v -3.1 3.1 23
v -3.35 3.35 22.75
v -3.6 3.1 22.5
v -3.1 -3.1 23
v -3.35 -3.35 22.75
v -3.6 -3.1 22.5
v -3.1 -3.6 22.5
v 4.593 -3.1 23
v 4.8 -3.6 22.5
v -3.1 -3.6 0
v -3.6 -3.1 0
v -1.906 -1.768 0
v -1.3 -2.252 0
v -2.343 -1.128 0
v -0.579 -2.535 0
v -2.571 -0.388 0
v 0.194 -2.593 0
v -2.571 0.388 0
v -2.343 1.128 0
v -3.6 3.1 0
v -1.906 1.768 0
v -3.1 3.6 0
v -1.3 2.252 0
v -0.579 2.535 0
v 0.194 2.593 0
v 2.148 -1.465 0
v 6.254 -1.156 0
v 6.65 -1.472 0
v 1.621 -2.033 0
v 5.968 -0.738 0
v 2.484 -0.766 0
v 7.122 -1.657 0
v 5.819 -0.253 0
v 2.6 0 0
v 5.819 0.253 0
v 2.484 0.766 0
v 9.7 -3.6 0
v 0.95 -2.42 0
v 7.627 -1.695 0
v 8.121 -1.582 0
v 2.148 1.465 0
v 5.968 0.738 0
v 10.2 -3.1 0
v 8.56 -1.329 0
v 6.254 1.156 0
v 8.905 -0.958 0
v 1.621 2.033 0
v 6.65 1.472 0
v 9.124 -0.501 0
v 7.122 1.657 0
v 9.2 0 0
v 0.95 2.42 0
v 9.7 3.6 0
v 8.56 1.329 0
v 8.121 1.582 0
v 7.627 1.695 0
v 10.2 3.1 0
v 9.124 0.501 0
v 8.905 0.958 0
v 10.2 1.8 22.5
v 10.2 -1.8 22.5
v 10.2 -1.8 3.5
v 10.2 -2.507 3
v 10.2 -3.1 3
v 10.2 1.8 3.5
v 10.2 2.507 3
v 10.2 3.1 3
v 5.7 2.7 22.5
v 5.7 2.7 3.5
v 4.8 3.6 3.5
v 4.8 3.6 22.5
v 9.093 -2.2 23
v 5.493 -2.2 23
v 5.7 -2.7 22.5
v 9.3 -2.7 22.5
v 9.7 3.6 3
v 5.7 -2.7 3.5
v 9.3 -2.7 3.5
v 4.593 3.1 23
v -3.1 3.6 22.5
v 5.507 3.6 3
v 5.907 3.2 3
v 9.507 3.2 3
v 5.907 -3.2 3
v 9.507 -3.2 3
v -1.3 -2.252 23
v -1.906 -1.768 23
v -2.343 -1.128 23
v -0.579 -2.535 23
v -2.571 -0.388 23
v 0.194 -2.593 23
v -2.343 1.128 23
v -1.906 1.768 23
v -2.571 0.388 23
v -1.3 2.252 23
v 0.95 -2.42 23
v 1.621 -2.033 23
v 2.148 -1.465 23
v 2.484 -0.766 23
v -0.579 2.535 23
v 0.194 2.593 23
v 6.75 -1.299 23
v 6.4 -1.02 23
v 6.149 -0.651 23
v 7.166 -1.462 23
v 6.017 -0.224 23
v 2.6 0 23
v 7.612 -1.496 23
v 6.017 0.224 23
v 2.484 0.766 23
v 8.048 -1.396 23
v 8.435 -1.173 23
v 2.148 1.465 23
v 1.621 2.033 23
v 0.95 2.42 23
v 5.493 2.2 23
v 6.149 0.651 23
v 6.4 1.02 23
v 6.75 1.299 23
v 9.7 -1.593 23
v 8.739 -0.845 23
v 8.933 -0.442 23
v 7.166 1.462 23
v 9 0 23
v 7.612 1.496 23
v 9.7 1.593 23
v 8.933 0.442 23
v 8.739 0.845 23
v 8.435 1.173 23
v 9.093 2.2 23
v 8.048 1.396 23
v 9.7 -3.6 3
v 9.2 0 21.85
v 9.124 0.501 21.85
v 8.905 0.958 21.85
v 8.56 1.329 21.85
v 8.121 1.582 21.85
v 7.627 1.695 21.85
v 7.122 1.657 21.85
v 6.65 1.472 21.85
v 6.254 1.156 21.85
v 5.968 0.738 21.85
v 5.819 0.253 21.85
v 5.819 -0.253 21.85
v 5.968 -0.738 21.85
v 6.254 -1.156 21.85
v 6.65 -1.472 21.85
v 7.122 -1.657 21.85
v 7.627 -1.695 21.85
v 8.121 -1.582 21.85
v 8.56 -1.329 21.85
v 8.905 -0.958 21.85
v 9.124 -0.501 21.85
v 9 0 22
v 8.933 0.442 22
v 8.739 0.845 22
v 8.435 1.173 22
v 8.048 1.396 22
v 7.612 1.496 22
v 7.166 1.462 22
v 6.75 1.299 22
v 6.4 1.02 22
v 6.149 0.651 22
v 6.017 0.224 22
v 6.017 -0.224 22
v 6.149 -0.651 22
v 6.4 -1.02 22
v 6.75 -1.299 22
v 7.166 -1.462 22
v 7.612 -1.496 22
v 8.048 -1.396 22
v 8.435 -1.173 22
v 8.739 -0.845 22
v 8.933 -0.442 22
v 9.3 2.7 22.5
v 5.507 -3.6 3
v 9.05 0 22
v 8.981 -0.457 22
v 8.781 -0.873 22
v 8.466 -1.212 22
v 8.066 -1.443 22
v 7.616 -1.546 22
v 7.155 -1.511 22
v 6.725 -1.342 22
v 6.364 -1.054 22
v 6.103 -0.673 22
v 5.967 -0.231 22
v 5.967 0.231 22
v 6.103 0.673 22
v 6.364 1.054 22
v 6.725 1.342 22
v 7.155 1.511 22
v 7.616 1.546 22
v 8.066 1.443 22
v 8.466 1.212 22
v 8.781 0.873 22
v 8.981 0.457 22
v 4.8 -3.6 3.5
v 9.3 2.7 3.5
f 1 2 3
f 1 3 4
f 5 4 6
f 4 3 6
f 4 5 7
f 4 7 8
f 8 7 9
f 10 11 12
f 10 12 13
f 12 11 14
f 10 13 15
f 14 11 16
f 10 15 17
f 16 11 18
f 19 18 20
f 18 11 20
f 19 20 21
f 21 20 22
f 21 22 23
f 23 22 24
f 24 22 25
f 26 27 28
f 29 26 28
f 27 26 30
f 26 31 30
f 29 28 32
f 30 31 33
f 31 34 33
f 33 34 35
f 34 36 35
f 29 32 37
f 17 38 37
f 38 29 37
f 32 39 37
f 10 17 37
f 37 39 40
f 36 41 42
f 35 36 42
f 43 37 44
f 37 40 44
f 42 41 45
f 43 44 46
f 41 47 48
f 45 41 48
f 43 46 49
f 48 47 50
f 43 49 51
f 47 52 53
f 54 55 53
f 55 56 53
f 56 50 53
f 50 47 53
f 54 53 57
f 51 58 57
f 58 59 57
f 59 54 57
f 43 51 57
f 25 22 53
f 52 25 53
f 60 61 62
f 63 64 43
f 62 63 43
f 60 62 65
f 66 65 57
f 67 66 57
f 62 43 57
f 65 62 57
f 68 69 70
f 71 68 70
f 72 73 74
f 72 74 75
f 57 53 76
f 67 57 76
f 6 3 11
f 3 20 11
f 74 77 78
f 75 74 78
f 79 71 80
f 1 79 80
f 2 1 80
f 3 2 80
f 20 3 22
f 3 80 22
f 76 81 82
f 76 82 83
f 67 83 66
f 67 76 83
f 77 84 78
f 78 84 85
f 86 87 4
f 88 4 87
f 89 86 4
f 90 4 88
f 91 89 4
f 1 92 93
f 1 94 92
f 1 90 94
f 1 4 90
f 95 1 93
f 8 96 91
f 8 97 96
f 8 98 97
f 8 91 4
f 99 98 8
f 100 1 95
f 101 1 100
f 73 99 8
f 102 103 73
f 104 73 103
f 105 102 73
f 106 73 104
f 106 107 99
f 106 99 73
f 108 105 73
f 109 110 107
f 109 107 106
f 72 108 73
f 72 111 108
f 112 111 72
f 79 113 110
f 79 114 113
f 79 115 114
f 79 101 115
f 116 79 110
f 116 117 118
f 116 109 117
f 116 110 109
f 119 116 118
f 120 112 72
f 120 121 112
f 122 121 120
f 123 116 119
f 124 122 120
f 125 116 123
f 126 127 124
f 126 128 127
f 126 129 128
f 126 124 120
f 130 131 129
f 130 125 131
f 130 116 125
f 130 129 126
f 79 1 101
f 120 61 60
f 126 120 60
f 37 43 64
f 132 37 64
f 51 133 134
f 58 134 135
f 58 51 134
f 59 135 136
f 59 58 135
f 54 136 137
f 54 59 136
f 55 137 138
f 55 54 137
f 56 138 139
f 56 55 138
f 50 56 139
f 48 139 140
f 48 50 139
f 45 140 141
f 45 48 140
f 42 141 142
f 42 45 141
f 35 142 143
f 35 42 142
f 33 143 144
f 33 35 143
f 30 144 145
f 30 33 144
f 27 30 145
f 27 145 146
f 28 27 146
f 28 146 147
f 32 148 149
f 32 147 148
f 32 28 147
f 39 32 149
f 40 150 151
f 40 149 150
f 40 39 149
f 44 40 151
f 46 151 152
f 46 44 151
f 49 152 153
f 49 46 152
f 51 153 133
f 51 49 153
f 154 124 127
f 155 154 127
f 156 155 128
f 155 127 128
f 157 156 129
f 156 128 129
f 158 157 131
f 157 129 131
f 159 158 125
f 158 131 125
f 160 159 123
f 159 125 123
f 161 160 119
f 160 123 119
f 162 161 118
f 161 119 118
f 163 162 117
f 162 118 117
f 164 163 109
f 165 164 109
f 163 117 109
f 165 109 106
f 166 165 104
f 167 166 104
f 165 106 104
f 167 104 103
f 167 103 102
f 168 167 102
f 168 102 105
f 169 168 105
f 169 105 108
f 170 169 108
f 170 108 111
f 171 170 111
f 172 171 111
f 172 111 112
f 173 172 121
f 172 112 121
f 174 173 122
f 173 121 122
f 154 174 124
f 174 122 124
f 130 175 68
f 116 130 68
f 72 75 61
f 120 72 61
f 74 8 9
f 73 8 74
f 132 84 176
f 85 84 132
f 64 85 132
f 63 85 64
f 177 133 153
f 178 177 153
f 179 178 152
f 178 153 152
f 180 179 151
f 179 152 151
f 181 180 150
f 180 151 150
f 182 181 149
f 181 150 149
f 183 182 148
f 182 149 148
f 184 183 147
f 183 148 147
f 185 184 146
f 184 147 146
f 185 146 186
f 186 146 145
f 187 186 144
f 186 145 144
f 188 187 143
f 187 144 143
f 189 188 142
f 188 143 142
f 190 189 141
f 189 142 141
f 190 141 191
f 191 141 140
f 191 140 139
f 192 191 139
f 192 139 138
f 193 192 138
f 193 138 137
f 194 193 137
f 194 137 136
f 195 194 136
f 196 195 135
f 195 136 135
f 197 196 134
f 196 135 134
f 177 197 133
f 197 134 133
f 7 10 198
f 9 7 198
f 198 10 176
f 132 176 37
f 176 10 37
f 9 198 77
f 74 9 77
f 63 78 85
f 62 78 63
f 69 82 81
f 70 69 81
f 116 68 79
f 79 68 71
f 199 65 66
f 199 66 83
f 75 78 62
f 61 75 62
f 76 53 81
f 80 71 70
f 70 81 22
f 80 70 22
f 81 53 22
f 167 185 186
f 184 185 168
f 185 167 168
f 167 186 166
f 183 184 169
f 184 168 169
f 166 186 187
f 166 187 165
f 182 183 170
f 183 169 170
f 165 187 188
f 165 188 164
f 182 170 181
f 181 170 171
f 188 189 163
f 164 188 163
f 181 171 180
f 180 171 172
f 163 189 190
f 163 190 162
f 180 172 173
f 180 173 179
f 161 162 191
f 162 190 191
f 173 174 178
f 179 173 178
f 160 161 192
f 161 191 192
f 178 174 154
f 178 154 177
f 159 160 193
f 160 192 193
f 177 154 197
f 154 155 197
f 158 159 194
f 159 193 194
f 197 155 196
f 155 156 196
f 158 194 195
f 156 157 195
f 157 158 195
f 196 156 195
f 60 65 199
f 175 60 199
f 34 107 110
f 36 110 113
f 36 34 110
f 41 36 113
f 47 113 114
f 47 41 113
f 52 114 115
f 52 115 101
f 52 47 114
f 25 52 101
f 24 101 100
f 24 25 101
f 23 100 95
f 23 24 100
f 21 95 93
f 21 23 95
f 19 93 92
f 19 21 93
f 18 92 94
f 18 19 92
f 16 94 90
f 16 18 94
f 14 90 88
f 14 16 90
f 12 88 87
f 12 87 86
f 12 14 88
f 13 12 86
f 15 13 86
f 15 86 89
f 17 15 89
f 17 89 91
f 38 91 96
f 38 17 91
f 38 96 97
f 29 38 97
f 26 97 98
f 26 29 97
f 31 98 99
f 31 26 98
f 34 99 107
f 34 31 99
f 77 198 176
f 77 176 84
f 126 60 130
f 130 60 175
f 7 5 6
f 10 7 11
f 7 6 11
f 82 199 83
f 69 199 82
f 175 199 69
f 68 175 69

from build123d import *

# Parameters (mm, degrees)
SKETCH_W        = 13.8
SKETCH_H        = 7.2
SKETCH_R        = 2.6
SKETCH_R_2      = 1.7
PAD_DEPTH       = 3
SKETCH001_R     = 2.6
SKETCH001_R_2   = 1.7
PAD001_DEPTH    = 20
CHAMFER_SIZE    = 0.5
CHAMFER001_SIZE = 0.5
CHAMFER002_SIZE = 0.5
SKETCH002_R     = 2
SKETCH002_R_2   = 1.5
PAD002_DEPTH    = 1
CHAMFER003_SIZE = 0.15
CHAMFER004_SIZE = 0.5


with BuildPart() as part:
    # Sketch → Pad (new body)
    with BuildSketch(Plane.XY):
        with Locations((3.3, 0)):
            Rectangle(SKETCH_W, SKETCH_H)
        Circle(SKETCH_R, mode=Mode.SUBTRACT)
        with Locations((7.5, 0)):
            Circle(SKETCH_R_2, mode=Mode.SUBTRACT)
    extrude(amount=PAD_DEPTH)

    # Sketch001 → Pad001 (new body)
    with BuildSketch(Plane.XY.offset(3)):
        Polygon((5.7, -2.7), (9.3, -2.7), (10.2, -1.8), (10.2, 1.8), (9.3, 2.7), (5.7, 2.7), (4.8, 3.6), (-3.6, 3.6), (-3.6, -3.6), (4.8, -3.6), align=None)
        Circle(SKETCH001_R, mode=Mode.SUBTRACT)
        with Locations((7.5, 0)):
            Circle(SKETCH001_R_2, mode=Mode.SUBTRACT)
    extrude(amount=PAD001_DEPTH)

    # Chamfer
    chamfer_edges = [part.edges().sort_by_distance(p)[0] for p in [
        (5.25, -3.15, 3),
        (7.5, -2.7, 3),
        (9.75, -2.25, 3),
        (9.75, 2.25, 3),
        (7.5, 2.7, 3),
        (5.25, 3.15, 3),
    ]]
    chamfer(chamfer_edges, length=CHAMFER_SIZE)

    # Chamfer001
    chamfer001_edges = [part.edges().sort_by_distance(p)[0] for p in [
        (0.6, -3.6, 23),
        (-3.6, 0, 23),
        (0.6, 3.6, 23),
        (5.25, 3.15, 23),
        (7.5, 2.7, 23),
        (9.75, 2.25, 23),
        (10.2, 0, 23),
        (9.75, -2.25, 23),
        (7.5, -2.7, 23),
        (5.25, -3.15, 23),
    ]]
    chamfer(chamfer001_edges, length=CHAMFER001_SIZE)

    # Chamfer002
    chamfer002_edges = [part.edges().sort_by_distance(p)[0] for p in [
        (10.2, -3.6, 1.5),
        (10.2, 3.6, 1.5),
    ]]
    chamfer(chamfer002_edges, length=CHAMFER002_SIZE)

    # Sketch002 → Pad002 (new body)
    with BuildSketch(Plane.XY.offset(23)):
        with Locations((7.5, 0)):
            Circle(SKETCH002_R)
        with Locations((7.5, 0)):
            Circle(SKETCH002_R_2, mode=Mode.SUBTRACT)
    extrude(amount=-PAD002_DEPTH)

    # Chamfer003
    chamfer003_edges = [part.edges().sort_by_distance(p)[0] for p in [
        (5.8, 0, 22),
    ]]
    chamfer(chamfer003_edges, length=CHAMFER003_SIZE)

    # Chamfer004
    chamfer004_edges = [part.edges().sort_by_distance(p)[0] for p in [
        (-3.6, 3.6, 12.75),
        (-3.6, 3.6, 1.5),
        (-3.6, -3.6, 1.5),
        (-3.6, -3.6, 12.75),
    ]]
    chamfer(chamfer004_edges, length=CHAMFER004_SIZE)


solid = part.part
